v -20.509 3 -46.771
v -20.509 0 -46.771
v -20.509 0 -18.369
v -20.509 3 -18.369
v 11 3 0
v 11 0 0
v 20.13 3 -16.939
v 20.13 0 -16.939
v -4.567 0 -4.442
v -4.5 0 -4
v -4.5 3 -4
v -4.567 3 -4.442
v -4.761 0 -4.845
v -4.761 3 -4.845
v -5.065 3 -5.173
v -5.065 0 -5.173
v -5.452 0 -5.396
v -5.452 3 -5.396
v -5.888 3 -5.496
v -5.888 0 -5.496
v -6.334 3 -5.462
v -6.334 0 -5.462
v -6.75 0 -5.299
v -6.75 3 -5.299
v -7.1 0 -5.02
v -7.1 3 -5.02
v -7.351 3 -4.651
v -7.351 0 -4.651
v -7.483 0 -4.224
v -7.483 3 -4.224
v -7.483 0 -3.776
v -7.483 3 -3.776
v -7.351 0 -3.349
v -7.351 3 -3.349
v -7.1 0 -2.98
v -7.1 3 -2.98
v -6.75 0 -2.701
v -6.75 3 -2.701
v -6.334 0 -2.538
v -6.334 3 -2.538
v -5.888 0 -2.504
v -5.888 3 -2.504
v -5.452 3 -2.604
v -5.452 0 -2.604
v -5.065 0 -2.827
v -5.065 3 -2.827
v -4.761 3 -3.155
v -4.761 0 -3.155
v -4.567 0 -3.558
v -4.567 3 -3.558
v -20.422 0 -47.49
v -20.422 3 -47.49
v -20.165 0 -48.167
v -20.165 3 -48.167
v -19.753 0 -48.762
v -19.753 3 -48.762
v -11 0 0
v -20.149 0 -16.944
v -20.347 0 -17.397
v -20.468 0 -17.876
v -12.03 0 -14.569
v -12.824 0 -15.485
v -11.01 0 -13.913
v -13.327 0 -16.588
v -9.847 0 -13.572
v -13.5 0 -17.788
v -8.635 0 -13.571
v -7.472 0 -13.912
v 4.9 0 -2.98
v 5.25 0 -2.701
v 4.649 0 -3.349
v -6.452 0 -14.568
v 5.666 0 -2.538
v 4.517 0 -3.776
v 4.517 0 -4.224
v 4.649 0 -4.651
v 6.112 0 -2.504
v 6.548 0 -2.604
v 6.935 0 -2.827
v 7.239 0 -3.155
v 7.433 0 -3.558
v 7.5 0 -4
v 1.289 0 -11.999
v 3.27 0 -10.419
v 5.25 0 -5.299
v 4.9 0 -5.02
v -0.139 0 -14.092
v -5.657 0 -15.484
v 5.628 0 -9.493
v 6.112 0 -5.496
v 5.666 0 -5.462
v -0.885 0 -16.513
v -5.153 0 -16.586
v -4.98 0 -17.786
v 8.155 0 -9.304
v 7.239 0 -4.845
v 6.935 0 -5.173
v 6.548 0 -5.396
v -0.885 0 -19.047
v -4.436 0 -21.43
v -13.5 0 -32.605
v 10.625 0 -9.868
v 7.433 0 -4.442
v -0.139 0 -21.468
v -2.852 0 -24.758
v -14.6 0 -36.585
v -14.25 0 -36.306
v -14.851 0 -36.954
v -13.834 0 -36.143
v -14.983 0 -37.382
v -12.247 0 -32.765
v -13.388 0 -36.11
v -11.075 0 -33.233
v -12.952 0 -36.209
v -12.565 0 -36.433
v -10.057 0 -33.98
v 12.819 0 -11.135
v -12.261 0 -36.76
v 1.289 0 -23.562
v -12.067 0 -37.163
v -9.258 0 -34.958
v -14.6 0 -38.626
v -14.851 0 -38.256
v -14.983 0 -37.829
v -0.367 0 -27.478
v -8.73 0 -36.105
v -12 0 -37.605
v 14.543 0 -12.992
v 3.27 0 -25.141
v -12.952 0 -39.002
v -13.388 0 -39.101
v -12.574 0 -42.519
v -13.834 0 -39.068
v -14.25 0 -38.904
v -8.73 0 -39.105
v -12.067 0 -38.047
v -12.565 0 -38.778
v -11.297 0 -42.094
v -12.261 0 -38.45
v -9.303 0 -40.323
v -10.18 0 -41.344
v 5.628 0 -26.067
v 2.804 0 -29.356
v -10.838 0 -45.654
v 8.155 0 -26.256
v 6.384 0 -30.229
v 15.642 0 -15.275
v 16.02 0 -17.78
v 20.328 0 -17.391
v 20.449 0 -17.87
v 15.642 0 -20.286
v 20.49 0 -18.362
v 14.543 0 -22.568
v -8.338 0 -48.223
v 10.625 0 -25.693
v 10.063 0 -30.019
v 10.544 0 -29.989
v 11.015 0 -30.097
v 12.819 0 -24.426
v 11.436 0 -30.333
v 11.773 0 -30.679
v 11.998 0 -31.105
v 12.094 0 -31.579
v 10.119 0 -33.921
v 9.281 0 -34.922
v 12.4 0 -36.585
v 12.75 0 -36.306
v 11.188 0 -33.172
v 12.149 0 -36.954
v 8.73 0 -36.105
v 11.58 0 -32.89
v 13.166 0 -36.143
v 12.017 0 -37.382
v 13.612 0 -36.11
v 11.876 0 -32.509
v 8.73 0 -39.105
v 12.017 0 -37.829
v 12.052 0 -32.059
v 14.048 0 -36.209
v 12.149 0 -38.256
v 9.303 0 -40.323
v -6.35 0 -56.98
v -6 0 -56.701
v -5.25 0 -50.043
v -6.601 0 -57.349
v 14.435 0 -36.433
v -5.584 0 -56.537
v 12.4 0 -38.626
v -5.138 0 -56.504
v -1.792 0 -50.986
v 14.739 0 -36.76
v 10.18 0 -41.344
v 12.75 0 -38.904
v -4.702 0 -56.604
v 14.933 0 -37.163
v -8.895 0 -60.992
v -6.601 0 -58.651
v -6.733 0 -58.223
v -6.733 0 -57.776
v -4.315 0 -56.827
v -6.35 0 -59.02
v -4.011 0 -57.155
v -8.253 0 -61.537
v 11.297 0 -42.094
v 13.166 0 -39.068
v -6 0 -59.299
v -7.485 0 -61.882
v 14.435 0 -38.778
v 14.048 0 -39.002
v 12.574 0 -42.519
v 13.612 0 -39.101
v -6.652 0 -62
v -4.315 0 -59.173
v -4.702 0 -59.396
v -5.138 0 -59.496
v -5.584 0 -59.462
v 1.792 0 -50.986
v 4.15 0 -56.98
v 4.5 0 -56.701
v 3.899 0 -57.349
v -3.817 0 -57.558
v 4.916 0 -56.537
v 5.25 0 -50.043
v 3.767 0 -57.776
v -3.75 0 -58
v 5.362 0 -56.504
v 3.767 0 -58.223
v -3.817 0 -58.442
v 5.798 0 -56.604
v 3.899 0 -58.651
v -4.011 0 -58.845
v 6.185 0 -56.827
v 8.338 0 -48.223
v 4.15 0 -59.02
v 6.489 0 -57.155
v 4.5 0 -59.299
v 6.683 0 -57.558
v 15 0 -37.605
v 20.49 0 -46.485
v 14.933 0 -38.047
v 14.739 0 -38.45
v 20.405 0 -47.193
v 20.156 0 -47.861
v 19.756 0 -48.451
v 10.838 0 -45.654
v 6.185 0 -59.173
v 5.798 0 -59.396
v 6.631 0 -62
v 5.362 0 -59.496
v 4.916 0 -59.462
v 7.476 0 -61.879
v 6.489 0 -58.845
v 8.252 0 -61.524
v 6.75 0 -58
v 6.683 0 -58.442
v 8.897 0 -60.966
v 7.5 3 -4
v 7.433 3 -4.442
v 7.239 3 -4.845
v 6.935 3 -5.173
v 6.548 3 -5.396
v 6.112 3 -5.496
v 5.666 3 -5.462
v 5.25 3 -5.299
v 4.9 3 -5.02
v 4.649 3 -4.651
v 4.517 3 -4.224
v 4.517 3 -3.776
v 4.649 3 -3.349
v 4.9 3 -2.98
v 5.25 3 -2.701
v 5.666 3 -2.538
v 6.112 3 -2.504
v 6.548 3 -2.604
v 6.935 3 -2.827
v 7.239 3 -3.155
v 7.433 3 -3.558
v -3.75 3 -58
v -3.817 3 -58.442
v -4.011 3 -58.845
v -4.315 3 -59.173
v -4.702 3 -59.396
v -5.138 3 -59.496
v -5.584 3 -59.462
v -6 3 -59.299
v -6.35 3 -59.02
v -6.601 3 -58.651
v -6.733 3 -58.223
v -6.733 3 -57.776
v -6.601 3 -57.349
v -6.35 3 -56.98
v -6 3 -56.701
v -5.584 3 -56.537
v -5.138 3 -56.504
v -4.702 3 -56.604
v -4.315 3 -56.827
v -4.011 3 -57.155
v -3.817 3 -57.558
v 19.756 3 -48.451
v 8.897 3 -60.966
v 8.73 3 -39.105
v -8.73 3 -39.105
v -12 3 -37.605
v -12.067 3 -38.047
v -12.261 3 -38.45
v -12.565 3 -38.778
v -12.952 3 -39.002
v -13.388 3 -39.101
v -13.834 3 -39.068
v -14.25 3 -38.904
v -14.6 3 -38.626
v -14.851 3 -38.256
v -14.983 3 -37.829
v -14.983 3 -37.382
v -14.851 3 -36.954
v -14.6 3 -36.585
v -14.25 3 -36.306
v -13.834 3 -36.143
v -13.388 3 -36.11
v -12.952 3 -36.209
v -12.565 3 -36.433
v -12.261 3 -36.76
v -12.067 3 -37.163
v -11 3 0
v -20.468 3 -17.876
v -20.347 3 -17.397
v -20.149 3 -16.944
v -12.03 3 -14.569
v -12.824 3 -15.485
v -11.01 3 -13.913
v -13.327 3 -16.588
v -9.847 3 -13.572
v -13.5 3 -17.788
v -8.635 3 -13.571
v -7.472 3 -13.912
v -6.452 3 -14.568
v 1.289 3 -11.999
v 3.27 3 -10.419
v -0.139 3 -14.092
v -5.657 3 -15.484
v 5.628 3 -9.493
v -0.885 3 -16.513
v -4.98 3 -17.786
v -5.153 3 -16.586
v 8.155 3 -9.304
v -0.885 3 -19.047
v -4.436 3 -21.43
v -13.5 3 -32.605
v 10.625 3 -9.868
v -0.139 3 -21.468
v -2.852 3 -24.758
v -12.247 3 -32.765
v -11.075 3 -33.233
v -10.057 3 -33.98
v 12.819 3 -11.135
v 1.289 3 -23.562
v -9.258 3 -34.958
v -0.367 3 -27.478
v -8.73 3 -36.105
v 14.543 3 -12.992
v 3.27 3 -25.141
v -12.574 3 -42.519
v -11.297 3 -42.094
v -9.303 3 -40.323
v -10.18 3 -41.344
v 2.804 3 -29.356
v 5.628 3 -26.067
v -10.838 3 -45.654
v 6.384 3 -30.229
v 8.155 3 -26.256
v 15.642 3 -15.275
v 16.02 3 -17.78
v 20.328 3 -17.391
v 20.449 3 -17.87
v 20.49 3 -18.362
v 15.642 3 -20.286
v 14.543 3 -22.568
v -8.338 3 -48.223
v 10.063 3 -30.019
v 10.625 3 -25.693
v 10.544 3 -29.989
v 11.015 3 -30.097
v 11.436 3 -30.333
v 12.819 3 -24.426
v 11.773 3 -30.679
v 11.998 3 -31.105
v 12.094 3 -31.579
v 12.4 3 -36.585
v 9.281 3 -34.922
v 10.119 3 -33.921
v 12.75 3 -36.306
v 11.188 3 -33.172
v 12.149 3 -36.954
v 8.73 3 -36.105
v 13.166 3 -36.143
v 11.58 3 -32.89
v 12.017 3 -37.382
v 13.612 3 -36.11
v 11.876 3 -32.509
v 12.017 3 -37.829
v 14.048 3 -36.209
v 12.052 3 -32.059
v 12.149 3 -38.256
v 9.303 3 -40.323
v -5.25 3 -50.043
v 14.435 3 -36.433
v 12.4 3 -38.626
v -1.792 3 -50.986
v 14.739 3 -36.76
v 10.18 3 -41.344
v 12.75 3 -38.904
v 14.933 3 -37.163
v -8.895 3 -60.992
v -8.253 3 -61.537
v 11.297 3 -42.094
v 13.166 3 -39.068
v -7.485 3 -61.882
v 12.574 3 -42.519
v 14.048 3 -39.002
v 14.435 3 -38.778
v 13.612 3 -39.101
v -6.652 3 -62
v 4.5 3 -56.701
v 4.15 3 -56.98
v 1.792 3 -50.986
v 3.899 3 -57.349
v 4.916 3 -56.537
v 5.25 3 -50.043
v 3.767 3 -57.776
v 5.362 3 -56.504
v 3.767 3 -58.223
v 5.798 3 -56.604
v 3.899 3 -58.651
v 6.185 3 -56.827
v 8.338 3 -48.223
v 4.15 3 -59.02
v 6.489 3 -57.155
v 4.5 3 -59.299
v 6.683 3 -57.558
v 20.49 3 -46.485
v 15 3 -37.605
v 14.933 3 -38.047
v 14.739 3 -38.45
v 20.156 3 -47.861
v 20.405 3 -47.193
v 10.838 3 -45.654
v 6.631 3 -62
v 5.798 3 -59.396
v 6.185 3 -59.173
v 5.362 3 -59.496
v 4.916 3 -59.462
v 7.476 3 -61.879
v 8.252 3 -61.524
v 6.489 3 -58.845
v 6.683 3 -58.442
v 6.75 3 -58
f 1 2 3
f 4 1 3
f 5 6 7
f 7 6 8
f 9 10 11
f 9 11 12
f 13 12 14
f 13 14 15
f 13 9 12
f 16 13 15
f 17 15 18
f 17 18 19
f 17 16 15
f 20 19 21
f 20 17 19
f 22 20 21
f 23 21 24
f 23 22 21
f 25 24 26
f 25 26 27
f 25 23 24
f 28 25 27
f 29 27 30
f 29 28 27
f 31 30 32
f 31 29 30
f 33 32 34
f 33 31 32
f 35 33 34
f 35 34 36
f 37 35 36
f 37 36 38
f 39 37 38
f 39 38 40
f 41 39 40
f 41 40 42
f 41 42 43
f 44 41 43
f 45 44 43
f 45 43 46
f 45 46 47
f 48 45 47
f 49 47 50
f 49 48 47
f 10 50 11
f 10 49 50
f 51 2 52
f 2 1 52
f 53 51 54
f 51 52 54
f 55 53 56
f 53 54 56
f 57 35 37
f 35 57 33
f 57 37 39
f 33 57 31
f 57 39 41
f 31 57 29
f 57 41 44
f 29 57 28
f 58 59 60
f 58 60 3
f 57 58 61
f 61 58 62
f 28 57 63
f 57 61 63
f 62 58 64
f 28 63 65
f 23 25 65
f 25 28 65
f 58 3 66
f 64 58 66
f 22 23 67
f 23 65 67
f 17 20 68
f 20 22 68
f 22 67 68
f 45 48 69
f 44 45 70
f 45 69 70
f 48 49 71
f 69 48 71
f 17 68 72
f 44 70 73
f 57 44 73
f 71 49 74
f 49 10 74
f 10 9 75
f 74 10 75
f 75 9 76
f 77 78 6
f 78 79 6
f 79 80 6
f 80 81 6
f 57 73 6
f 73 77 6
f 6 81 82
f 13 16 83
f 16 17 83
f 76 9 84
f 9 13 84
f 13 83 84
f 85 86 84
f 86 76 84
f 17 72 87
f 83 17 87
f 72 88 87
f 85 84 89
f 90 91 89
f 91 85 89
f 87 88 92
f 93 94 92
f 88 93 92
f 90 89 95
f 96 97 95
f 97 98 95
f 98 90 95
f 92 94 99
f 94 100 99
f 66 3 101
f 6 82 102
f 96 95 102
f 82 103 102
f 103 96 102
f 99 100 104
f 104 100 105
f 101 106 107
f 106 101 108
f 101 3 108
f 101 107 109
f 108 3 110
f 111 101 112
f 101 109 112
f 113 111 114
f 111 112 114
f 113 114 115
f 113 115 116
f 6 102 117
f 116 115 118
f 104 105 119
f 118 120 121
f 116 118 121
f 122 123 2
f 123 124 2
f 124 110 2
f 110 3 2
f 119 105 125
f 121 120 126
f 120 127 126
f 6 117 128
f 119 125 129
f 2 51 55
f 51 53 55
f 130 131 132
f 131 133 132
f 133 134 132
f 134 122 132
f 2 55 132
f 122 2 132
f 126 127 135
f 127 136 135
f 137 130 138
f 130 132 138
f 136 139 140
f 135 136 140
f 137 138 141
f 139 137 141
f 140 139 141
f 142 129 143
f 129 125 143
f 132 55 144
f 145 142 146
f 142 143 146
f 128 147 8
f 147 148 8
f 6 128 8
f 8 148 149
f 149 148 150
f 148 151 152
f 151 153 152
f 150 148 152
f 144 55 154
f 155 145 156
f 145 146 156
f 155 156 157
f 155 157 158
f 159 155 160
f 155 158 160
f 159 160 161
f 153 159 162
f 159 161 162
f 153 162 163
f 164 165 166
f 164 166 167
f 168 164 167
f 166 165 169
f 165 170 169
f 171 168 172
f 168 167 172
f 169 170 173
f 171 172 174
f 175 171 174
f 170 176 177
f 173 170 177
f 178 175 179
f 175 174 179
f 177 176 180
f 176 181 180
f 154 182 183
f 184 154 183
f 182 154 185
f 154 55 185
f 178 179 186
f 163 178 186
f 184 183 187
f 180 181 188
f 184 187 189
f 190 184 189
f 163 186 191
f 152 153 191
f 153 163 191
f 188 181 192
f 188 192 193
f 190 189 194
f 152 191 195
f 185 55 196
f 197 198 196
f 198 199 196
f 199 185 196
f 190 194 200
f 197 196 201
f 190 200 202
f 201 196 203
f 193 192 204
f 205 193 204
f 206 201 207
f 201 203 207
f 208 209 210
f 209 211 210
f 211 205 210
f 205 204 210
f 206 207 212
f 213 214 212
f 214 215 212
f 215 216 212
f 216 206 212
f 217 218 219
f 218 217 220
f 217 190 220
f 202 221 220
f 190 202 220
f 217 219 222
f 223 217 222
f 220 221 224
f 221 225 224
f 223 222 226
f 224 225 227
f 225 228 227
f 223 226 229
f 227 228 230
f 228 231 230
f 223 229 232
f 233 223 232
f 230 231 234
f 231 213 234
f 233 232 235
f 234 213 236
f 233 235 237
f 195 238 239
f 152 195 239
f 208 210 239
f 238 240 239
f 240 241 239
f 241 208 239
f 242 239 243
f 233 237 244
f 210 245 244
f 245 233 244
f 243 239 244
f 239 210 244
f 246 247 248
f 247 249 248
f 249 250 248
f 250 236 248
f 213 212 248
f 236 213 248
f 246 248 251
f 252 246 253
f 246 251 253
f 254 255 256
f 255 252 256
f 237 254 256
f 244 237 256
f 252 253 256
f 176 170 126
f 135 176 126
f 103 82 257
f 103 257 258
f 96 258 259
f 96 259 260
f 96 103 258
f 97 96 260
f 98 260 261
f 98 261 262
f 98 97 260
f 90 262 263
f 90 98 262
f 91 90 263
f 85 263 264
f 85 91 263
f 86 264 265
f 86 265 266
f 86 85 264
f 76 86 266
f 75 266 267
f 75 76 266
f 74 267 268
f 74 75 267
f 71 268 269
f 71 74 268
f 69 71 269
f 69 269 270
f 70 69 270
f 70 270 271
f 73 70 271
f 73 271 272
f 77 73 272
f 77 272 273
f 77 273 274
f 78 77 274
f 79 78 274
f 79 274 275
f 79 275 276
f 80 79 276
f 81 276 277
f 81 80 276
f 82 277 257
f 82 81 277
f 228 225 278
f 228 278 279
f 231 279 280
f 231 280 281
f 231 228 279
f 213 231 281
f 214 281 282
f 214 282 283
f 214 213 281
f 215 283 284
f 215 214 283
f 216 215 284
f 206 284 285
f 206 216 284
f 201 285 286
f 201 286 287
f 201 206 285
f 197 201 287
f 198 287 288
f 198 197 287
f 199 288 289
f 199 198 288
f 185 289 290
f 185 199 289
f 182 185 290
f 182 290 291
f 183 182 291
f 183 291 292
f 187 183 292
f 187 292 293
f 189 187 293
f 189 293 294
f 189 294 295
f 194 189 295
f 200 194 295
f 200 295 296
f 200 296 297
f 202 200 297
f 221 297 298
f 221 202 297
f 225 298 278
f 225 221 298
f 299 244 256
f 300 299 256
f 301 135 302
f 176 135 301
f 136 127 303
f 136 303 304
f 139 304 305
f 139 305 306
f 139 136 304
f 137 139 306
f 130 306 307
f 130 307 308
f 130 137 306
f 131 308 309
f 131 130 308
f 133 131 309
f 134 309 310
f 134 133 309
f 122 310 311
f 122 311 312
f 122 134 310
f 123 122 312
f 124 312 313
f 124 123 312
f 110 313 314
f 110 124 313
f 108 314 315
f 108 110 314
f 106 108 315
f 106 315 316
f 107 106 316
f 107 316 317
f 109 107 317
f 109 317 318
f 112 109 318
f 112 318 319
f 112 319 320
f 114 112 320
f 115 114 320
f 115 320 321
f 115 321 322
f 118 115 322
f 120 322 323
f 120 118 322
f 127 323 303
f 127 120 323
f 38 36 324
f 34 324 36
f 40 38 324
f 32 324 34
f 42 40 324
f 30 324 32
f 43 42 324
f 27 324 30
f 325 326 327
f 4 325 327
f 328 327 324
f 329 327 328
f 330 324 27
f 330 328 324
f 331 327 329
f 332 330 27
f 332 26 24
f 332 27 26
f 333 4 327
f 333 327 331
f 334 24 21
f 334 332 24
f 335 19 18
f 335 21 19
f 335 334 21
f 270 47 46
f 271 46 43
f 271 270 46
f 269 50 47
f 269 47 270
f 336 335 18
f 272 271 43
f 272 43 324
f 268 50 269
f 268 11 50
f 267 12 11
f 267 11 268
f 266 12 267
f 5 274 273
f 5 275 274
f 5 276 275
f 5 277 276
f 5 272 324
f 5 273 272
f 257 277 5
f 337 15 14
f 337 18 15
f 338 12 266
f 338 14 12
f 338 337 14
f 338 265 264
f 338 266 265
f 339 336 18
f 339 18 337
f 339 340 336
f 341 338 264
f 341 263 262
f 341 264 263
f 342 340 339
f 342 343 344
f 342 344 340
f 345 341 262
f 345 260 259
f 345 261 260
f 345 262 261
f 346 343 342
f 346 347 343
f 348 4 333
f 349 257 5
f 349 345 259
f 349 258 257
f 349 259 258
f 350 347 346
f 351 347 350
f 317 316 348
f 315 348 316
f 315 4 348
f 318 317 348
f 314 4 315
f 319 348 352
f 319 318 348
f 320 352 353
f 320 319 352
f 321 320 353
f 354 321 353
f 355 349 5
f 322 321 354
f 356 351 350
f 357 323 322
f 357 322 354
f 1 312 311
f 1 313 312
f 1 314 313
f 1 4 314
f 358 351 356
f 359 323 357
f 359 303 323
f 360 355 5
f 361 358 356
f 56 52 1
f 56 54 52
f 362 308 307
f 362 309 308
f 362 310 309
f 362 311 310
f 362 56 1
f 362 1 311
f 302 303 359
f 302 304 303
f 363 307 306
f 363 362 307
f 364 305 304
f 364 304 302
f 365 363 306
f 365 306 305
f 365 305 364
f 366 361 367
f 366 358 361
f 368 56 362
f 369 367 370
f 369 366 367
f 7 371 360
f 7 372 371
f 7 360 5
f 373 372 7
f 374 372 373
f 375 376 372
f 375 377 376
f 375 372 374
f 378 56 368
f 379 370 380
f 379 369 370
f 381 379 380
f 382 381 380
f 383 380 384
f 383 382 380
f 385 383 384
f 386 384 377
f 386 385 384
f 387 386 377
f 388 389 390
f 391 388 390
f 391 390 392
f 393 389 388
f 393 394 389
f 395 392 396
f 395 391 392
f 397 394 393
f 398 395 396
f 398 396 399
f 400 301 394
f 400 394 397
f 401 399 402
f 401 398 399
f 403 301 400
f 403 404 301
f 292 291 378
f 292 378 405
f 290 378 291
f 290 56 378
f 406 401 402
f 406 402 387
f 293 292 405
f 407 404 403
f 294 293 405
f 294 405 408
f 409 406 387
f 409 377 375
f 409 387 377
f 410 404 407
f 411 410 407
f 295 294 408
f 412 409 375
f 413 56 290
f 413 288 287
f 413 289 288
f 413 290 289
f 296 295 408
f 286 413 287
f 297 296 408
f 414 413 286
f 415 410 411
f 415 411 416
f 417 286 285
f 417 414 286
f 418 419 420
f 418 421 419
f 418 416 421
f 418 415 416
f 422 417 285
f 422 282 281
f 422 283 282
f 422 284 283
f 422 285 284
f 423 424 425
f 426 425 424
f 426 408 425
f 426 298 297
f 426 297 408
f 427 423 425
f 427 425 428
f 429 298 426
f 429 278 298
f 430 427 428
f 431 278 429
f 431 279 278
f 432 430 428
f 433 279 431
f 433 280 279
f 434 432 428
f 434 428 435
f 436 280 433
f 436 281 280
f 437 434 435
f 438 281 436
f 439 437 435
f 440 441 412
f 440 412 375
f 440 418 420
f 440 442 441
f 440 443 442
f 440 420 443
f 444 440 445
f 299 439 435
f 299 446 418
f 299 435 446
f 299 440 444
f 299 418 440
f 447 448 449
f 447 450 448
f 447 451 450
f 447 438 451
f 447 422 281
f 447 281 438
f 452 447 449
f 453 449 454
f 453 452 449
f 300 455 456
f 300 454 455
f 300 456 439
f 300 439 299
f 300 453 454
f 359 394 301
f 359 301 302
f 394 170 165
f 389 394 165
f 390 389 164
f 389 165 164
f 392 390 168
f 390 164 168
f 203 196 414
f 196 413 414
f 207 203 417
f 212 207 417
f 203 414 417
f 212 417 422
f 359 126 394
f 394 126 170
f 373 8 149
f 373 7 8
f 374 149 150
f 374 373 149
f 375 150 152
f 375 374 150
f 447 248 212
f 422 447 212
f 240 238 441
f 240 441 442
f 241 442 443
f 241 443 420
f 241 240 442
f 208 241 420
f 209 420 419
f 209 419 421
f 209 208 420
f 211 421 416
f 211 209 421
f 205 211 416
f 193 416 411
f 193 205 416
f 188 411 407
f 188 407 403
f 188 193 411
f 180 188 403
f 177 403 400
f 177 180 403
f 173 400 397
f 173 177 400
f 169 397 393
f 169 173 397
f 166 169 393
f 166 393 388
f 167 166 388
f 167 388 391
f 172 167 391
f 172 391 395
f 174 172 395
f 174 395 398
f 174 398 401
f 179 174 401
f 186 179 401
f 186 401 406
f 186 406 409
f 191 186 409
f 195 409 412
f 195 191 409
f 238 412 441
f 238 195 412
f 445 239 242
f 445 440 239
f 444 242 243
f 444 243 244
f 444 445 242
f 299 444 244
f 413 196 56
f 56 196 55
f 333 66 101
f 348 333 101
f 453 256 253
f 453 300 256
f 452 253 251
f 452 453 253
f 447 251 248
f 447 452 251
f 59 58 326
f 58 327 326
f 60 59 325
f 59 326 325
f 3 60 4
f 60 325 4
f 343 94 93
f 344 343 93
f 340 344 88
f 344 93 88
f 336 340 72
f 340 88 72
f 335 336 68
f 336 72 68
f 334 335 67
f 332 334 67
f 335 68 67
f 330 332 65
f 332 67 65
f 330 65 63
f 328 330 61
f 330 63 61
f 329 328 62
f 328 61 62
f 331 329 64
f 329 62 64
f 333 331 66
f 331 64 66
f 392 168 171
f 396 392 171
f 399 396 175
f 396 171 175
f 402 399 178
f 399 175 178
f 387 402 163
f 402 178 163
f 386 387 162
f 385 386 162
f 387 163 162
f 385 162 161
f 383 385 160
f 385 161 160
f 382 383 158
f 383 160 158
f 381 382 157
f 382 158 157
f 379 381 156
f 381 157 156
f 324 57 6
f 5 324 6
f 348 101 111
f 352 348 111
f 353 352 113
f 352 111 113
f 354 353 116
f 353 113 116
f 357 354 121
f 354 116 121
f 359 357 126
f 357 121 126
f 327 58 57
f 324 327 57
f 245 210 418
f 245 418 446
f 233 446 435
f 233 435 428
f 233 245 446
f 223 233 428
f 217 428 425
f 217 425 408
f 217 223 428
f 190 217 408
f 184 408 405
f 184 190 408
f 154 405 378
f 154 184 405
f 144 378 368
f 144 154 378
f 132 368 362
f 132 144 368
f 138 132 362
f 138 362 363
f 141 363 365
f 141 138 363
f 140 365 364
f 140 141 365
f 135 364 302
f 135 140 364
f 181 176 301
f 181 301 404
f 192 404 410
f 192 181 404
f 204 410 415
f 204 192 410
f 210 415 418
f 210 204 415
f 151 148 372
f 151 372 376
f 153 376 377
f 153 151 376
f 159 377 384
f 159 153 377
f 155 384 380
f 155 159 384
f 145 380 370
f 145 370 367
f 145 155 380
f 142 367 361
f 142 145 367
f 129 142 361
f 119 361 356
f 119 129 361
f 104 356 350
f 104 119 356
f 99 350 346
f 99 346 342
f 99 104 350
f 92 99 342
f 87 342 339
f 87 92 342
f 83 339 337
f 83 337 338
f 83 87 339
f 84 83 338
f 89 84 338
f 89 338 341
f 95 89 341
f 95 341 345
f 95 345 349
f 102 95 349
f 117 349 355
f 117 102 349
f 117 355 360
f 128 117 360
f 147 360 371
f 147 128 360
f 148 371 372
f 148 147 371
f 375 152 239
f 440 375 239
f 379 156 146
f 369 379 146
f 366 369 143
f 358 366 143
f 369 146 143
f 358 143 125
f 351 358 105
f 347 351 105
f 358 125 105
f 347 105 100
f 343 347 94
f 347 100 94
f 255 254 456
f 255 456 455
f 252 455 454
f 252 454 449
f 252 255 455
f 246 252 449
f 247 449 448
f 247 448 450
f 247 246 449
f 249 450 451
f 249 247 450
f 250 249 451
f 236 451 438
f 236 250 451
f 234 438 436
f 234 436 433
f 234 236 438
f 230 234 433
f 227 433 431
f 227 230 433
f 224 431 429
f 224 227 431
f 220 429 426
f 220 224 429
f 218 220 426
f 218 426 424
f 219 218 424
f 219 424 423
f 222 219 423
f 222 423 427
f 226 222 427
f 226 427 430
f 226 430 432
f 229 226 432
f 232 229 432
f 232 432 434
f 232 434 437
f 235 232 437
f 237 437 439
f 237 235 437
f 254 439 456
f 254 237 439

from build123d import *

# Parameters (mm, degrees)
SKETCH1_R           = 8.5
SKETCH1_R_2         = 1.5
BOSS_EXTRUDE1_DEPTH = 3
FILLET1_R           = 3


with BuildPart() as part:
    # Sketch1 → Boss-Extrude1 (new body)
    with BuildSketch(Plane(origin=(0, 0, 0), x_dir=(1, 0, 0), z_dir=(0, 1, 0))):
        Polygon((-11, 0), (11, 0), (20.489621783, 17.605313925), (20.489621783, 47.605313925), (8, 62), (-8, 62), (-20.509243816, 47.910305032), (-20.509243816, 17.610706132), align=None)
        with Locations((7.519679741, 17.780252273)):
            Circle(SKETCH1_R, mode=Mode.SUBTRACT)
        with Locations((6, 4)):
            Circle(SKETCH1_R_2, mode=Mode.SUBTRACT)
        with Locations((-6, 4)):
            Circle(SKETCH1_R_2, mode=Mode.SUBTRACT)
        with Locations((-5.25, 57.999859765)):
            Circle(SKETCH1_R_2, mode=Mode.SUBTRACT)
        with Locations((5.25, 57.999859765)):
            Circle(SKETCH1_R_2, mode=Mode.SUBTRACT)
        with Locations((-13.5, 37.605313925)):
            Circle(SKETCH1_R_2, mode=Mode.SUBTRACT)
        with Locations((13.5, 37.605313925)):
            Circle(SKETCH1_R_2, mode=Mode.SUBTRACT)
        with BuildLine():
            Line((-8.730303993, 39.105313925), (8.730303993, 39.105313925))
            ThreePointArc((8.730303993, 39.105313925), (10.179901517, 41.34388933), (12.574074074, 42.518832133))
            ThreePointArc((12.574074074, 42.518832133), (0, 51.105313925), (-12.574074074, 42.518832133))
            ThreePointArc((-12.574074074, 42.518832133), (-10.179901517, 41.34388933), (-8.730303993, 39.105313925))
        make_face(mode=Mode.SUBTRACT)
        with BuildLine():
            Line((-8.730303993, 36.105313925), (8.730303993, 36.105313925))
            ThreePointArc((8.730303993, 36.105313925), (9.667400631, 34.394210987), (11.187975781, 33.171969363))
            ThreePointArc((11.187975781, 33.171969363), (11.998189223, 31.105465162), (10.062695821, 30.018841621))
            ThreePointArc((10.062695821, 30.018841621), (-0.366780245, 27.478383479), (-4.980318958, 17.785955551))
            ThreePointArc((-4.980318958, 17.785955551), (-9.241131059, 13.528058523), (-13.5, 17.787899155))
            Line((-13.5, 17.787899155), (-13.5, 32.605313925))
            ThreePointArc((-13.5, 32.605313925), (-10.541960108, 33.574185051), (-8.730303993, 36.105313925))
        make_face(mode=Mode.SUBTRACT)
    extrude(amount=BOSS_EXTRUDE1_DEPTH)

    # Fillet1
    fillet1_edges = [part.edges().sort_by_distance(p)[0] for p in [
        (-20.509243816, 1.5, -17.610706132),
        (-20.509243816, 1.5, -47.910305032),
        (-8, 1.5, -62),
        (8, 1.5, -62),
        (20.489621783, 1.5, -47.605313925),
        (20.489621783, 1.5, -17.605313925),
    ]]
    fillet(fillet1_edges, radius=FILLET1_R)


solid = part.part
